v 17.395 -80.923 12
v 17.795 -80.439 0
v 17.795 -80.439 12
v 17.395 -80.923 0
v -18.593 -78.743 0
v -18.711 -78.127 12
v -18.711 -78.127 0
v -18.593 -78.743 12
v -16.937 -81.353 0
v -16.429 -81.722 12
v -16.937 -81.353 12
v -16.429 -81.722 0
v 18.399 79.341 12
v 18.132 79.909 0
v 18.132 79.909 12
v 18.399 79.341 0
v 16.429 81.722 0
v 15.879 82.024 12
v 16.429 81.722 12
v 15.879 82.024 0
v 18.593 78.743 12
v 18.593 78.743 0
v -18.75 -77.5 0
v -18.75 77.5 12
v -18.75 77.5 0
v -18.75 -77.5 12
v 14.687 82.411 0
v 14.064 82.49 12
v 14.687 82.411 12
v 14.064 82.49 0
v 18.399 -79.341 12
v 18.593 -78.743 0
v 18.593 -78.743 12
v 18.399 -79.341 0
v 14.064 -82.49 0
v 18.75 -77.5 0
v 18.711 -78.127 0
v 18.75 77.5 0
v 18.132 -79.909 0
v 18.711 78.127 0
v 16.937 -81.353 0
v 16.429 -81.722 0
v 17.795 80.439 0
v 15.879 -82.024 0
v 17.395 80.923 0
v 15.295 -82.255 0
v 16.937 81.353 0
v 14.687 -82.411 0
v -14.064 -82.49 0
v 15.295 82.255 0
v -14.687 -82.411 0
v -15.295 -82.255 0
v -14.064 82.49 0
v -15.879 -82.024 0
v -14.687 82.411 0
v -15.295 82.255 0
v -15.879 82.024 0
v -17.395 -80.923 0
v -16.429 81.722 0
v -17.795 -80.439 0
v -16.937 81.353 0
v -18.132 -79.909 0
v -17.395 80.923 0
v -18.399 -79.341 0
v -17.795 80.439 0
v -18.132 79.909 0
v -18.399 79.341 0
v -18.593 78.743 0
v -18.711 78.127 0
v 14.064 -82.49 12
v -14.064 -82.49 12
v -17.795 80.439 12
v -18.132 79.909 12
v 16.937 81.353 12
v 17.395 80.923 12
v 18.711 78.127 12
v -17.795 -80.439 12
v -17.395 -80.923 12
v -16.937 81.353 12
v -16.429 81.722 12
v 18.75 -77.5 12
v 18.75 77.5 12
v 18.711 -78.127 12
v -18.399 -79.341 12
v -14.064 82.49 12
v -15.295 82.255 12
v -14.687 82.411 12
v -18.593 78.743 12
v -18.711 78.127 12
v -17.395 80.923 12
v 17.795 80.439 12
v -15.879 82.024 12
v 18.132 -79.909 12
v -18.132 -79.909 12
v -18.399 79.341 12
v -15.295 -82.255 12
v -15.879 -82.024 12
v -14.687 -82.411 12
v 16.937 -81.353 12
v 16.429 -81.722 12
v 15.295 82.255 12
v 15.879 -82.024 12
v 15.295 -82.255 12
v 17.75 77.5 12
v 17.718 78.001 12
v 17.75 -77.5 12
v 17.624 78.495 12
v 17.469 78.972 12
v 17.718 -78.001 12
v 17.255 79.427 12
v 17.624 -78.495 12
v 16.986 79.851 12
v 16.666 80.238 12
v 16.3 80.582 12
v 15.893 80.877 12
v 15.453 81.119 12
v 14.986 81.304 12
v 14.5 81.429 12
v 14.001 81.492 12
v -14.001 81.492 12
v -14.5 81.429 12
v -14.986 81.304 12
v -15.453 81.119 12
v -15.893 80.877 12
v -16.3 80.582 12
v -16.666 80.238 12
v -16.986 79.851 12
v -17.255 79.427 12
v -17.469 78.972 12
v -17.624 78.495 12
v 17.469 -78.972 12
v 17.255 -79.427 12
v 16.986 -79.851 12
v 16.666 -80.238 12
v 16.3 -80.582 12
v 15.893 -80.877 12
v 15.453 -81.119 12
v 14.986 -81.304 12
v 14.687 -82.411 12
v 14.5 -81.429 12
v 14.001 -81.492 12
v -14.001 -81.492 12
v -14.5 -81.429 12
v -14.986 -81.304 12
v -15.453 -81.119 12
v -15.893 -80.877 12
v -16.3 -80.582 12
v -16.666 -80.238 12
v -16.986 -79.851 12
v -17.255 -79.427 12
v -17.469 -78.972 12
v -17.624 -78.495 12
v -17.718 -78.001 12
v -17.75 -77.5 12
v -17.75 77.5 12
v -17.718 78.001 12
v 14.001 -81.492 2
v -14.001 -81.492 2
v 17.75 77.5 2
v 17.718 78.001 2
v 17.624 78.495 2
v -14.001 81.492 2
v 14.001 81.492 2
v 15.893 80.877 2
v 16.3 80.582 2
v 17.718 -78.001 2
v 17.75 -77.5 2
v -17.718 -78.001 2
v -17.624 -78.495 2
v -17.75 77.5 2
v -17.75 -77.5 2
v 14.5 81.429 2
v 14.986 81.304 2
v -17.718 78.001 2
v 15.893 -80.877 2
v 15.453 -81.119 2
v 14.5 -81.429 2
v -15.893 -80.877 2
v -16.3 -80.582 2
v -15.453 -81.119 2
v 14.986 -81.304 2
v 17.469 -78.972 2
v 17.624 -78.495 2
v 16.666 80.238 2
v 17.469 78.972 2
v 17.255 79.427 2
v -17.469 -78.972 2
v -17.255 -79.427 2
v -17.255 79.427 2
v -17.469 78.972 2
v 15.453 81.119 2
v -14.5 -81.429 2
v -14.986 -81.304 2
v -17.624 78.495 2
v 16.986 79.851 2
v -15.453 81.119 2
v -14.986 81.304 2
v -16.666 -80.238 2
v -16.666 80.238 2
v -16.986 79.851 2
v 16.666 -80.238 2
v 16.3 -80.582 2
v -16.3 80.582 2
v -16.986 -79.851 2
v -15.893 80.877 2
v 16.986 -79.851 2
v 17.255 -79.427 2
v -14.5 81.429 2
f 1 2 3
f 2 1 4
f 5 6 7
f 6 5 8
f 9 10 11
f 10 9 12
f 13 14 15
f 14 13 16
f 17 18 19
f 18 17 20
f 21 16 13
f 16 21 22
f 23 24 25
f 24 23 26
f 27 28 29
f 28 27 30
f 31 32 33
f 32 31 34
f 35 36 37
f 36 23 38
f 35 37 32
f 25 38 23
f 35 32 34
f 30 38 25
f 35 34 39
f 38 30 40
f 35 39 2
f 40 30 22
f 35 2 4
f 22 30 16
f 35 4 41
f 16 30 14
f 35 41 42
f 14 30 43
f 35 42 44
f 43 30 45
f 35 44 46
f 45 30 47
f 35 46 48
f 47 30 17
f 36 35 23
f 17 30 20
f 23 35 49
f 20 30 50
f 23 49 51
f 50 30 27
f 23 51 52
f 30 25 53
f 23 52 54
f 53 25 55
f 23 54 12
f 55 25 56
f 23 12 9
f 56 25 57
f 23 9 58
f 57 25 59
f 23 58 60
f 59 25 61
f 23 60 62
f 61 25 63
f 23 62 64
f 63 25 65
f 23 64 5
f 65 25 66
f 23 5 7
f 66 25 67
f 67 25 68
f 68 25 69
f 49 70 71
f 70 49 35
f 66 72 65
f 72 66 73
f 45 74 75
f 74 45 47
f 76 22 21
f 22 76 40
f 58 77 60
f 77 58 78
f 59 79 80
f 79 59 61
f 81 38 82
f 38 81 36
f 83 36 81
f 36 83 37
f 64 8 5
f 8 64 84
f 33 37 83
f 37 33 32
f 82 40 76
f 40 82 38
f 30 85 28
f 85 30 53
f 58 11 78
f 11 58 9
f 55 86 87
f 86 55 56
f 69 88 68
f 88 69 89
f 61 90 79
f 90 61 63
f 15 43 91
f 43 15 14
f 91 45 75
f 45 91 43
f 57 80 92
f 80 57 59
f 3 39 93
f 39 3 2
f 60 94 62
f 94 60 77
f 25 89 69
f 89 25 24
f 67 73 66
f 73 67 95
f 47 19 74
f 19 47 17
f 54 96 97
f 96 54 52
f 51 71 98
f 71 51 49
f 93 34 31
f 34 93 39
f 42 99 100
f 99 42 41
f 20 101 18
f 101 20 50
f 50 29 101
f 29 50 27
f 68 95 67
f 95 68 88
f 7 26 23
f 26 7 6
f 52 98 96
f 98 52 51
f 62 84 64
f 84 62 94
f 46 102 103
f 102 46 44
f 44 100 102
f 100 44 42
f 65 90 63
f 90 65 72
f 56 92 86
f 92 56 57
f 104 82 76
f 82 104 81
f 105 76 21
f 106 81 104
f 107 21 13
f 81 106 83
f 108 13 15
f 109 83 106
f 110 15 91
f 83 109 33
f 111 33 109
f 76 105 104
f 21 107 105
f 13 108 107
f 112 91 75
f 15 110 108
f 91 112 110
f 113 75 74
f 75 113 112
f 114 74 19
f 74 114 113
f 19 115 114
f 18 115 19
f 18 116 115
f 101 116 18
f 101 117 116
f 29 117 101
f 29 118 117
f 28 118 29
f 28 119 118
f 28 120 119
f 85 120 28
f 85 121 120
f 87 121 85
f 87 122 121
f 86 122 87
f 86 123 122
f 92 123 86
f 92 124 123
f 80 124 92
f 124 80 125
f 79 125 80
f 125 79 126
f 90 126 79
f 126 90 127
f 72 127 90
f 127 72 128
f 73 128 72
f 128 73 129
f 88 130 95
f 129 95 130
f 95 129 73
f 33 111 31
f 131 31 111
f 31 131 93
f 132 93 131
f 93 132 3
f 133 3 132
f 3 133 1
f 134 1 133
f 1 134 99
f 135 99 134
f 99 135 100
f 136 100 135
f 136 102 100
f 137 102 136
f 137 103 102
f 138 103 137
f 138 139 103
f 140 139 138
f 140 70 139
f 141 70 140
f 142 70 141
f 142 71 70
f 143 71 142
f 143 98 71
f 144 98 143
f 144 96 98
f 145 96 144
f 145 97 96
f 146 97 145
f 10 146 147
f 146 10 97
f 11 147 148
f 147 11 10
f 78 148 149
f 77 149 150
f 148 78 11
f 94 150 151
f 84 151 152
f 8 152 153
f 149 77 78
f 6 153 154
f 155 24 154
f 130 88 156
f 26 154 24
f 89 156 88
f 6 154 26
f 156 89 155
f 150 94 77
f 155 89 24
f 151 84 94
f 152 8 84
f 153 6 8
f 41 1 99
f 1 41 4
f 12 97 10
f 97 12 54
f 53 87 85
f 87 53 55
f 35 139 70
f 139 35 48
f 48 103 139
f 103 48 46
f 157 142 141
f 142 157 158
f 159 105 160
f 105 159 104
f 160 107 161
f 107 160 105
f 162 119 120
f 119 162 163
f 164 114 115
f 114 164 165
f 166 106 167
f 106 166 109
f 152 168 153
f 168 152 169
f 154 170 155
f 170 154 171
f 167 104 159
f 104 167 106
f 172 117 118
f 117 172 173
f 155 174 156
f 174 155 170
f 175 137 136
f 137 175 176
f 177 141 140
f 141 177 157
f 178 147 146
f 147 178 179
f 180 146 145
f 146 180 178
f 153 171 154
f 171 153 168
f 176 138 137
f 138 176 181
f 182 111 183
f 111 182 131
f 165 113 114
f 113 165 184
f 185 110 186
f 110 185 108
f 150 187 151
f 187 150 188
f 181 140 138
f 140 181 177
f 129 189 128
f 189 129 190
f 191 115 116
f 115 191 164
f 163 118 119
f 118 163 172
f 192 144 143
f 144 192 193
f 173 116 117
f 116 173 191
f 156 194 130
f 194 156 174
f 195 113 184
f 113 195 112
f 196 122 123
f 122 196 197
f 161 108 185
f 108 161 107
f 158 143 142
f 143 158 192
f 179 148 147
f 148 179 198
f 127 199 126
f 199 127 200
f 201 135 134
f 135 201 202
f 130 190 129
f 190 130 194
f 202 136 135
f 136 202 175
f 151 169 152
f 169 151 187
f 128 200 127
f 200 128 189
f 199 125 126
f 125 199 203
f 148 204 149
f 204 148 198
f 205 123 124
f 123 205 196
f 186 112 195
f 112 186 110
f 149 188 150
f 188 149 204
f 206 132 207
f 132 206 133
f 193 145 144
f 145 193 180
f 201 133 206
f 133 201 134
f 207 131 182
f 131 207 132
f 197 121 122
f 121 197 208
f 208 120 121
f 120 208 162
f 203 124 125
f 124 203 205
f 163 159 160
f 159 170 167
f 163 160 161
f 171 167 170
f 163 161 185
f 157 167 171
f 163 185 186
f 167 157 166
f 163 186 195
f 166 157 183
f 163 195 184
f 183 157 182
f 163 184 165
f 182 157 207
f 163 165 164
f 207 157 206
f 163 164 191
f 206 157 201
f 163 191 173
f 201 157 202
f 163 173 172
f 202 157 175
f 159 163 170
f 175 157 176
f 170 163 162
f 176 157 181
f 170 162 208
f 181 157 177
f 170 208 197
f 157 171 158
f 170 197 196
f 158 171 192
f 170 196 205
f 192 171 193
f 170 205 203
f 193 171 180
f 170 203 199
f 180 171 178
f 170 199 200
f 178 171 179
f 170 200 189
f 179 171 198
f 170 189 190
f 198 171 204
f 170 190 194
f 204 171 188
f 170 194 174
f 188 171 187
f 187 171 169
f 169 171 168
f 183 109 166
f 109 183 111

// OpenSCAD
$fn = 50;


difference() {
	union() {
		hull() {
			translate(v = [-13.7500000000, 77.5000000000, 0]) {
				cylinder(h = 12, r = 5);
			}
			translate(v = [13.7500000000, 77.5000000000, 0]) {
				cylinder(h = 12, r = 5);
			}
			translate(v = [-13.7500000000, -77.5000000000, 0]) {
				cylinder(h = 12, r = 5);
			}
			translate(v = [13.7500000000, -77.5000000000, 0]) {
				cylinder(h = 12, r = 5);
			}
		}
	}
	union() {
		translate(v = [0, 0, 2]) {
			hull() {
				translate(v = [-13.7500000000, 77.5000000000, 0]) {
					cylinder(h = 10, r = 4);
				}
				translate(v = [13.7500000000, 77.5000000000, 0]) {
					cylinder(h = 10, r = 4);
				}
				translate(v = [-13.7500000000, -77.5000000000, 0]) {
					cylinder(h = 10, r = 4);
				}
				translate(v = [13.7500000000, -77.5000000000, 0]) {
					cylinder(h = 10, r = 4);
				}
			}
		}
	}
}
